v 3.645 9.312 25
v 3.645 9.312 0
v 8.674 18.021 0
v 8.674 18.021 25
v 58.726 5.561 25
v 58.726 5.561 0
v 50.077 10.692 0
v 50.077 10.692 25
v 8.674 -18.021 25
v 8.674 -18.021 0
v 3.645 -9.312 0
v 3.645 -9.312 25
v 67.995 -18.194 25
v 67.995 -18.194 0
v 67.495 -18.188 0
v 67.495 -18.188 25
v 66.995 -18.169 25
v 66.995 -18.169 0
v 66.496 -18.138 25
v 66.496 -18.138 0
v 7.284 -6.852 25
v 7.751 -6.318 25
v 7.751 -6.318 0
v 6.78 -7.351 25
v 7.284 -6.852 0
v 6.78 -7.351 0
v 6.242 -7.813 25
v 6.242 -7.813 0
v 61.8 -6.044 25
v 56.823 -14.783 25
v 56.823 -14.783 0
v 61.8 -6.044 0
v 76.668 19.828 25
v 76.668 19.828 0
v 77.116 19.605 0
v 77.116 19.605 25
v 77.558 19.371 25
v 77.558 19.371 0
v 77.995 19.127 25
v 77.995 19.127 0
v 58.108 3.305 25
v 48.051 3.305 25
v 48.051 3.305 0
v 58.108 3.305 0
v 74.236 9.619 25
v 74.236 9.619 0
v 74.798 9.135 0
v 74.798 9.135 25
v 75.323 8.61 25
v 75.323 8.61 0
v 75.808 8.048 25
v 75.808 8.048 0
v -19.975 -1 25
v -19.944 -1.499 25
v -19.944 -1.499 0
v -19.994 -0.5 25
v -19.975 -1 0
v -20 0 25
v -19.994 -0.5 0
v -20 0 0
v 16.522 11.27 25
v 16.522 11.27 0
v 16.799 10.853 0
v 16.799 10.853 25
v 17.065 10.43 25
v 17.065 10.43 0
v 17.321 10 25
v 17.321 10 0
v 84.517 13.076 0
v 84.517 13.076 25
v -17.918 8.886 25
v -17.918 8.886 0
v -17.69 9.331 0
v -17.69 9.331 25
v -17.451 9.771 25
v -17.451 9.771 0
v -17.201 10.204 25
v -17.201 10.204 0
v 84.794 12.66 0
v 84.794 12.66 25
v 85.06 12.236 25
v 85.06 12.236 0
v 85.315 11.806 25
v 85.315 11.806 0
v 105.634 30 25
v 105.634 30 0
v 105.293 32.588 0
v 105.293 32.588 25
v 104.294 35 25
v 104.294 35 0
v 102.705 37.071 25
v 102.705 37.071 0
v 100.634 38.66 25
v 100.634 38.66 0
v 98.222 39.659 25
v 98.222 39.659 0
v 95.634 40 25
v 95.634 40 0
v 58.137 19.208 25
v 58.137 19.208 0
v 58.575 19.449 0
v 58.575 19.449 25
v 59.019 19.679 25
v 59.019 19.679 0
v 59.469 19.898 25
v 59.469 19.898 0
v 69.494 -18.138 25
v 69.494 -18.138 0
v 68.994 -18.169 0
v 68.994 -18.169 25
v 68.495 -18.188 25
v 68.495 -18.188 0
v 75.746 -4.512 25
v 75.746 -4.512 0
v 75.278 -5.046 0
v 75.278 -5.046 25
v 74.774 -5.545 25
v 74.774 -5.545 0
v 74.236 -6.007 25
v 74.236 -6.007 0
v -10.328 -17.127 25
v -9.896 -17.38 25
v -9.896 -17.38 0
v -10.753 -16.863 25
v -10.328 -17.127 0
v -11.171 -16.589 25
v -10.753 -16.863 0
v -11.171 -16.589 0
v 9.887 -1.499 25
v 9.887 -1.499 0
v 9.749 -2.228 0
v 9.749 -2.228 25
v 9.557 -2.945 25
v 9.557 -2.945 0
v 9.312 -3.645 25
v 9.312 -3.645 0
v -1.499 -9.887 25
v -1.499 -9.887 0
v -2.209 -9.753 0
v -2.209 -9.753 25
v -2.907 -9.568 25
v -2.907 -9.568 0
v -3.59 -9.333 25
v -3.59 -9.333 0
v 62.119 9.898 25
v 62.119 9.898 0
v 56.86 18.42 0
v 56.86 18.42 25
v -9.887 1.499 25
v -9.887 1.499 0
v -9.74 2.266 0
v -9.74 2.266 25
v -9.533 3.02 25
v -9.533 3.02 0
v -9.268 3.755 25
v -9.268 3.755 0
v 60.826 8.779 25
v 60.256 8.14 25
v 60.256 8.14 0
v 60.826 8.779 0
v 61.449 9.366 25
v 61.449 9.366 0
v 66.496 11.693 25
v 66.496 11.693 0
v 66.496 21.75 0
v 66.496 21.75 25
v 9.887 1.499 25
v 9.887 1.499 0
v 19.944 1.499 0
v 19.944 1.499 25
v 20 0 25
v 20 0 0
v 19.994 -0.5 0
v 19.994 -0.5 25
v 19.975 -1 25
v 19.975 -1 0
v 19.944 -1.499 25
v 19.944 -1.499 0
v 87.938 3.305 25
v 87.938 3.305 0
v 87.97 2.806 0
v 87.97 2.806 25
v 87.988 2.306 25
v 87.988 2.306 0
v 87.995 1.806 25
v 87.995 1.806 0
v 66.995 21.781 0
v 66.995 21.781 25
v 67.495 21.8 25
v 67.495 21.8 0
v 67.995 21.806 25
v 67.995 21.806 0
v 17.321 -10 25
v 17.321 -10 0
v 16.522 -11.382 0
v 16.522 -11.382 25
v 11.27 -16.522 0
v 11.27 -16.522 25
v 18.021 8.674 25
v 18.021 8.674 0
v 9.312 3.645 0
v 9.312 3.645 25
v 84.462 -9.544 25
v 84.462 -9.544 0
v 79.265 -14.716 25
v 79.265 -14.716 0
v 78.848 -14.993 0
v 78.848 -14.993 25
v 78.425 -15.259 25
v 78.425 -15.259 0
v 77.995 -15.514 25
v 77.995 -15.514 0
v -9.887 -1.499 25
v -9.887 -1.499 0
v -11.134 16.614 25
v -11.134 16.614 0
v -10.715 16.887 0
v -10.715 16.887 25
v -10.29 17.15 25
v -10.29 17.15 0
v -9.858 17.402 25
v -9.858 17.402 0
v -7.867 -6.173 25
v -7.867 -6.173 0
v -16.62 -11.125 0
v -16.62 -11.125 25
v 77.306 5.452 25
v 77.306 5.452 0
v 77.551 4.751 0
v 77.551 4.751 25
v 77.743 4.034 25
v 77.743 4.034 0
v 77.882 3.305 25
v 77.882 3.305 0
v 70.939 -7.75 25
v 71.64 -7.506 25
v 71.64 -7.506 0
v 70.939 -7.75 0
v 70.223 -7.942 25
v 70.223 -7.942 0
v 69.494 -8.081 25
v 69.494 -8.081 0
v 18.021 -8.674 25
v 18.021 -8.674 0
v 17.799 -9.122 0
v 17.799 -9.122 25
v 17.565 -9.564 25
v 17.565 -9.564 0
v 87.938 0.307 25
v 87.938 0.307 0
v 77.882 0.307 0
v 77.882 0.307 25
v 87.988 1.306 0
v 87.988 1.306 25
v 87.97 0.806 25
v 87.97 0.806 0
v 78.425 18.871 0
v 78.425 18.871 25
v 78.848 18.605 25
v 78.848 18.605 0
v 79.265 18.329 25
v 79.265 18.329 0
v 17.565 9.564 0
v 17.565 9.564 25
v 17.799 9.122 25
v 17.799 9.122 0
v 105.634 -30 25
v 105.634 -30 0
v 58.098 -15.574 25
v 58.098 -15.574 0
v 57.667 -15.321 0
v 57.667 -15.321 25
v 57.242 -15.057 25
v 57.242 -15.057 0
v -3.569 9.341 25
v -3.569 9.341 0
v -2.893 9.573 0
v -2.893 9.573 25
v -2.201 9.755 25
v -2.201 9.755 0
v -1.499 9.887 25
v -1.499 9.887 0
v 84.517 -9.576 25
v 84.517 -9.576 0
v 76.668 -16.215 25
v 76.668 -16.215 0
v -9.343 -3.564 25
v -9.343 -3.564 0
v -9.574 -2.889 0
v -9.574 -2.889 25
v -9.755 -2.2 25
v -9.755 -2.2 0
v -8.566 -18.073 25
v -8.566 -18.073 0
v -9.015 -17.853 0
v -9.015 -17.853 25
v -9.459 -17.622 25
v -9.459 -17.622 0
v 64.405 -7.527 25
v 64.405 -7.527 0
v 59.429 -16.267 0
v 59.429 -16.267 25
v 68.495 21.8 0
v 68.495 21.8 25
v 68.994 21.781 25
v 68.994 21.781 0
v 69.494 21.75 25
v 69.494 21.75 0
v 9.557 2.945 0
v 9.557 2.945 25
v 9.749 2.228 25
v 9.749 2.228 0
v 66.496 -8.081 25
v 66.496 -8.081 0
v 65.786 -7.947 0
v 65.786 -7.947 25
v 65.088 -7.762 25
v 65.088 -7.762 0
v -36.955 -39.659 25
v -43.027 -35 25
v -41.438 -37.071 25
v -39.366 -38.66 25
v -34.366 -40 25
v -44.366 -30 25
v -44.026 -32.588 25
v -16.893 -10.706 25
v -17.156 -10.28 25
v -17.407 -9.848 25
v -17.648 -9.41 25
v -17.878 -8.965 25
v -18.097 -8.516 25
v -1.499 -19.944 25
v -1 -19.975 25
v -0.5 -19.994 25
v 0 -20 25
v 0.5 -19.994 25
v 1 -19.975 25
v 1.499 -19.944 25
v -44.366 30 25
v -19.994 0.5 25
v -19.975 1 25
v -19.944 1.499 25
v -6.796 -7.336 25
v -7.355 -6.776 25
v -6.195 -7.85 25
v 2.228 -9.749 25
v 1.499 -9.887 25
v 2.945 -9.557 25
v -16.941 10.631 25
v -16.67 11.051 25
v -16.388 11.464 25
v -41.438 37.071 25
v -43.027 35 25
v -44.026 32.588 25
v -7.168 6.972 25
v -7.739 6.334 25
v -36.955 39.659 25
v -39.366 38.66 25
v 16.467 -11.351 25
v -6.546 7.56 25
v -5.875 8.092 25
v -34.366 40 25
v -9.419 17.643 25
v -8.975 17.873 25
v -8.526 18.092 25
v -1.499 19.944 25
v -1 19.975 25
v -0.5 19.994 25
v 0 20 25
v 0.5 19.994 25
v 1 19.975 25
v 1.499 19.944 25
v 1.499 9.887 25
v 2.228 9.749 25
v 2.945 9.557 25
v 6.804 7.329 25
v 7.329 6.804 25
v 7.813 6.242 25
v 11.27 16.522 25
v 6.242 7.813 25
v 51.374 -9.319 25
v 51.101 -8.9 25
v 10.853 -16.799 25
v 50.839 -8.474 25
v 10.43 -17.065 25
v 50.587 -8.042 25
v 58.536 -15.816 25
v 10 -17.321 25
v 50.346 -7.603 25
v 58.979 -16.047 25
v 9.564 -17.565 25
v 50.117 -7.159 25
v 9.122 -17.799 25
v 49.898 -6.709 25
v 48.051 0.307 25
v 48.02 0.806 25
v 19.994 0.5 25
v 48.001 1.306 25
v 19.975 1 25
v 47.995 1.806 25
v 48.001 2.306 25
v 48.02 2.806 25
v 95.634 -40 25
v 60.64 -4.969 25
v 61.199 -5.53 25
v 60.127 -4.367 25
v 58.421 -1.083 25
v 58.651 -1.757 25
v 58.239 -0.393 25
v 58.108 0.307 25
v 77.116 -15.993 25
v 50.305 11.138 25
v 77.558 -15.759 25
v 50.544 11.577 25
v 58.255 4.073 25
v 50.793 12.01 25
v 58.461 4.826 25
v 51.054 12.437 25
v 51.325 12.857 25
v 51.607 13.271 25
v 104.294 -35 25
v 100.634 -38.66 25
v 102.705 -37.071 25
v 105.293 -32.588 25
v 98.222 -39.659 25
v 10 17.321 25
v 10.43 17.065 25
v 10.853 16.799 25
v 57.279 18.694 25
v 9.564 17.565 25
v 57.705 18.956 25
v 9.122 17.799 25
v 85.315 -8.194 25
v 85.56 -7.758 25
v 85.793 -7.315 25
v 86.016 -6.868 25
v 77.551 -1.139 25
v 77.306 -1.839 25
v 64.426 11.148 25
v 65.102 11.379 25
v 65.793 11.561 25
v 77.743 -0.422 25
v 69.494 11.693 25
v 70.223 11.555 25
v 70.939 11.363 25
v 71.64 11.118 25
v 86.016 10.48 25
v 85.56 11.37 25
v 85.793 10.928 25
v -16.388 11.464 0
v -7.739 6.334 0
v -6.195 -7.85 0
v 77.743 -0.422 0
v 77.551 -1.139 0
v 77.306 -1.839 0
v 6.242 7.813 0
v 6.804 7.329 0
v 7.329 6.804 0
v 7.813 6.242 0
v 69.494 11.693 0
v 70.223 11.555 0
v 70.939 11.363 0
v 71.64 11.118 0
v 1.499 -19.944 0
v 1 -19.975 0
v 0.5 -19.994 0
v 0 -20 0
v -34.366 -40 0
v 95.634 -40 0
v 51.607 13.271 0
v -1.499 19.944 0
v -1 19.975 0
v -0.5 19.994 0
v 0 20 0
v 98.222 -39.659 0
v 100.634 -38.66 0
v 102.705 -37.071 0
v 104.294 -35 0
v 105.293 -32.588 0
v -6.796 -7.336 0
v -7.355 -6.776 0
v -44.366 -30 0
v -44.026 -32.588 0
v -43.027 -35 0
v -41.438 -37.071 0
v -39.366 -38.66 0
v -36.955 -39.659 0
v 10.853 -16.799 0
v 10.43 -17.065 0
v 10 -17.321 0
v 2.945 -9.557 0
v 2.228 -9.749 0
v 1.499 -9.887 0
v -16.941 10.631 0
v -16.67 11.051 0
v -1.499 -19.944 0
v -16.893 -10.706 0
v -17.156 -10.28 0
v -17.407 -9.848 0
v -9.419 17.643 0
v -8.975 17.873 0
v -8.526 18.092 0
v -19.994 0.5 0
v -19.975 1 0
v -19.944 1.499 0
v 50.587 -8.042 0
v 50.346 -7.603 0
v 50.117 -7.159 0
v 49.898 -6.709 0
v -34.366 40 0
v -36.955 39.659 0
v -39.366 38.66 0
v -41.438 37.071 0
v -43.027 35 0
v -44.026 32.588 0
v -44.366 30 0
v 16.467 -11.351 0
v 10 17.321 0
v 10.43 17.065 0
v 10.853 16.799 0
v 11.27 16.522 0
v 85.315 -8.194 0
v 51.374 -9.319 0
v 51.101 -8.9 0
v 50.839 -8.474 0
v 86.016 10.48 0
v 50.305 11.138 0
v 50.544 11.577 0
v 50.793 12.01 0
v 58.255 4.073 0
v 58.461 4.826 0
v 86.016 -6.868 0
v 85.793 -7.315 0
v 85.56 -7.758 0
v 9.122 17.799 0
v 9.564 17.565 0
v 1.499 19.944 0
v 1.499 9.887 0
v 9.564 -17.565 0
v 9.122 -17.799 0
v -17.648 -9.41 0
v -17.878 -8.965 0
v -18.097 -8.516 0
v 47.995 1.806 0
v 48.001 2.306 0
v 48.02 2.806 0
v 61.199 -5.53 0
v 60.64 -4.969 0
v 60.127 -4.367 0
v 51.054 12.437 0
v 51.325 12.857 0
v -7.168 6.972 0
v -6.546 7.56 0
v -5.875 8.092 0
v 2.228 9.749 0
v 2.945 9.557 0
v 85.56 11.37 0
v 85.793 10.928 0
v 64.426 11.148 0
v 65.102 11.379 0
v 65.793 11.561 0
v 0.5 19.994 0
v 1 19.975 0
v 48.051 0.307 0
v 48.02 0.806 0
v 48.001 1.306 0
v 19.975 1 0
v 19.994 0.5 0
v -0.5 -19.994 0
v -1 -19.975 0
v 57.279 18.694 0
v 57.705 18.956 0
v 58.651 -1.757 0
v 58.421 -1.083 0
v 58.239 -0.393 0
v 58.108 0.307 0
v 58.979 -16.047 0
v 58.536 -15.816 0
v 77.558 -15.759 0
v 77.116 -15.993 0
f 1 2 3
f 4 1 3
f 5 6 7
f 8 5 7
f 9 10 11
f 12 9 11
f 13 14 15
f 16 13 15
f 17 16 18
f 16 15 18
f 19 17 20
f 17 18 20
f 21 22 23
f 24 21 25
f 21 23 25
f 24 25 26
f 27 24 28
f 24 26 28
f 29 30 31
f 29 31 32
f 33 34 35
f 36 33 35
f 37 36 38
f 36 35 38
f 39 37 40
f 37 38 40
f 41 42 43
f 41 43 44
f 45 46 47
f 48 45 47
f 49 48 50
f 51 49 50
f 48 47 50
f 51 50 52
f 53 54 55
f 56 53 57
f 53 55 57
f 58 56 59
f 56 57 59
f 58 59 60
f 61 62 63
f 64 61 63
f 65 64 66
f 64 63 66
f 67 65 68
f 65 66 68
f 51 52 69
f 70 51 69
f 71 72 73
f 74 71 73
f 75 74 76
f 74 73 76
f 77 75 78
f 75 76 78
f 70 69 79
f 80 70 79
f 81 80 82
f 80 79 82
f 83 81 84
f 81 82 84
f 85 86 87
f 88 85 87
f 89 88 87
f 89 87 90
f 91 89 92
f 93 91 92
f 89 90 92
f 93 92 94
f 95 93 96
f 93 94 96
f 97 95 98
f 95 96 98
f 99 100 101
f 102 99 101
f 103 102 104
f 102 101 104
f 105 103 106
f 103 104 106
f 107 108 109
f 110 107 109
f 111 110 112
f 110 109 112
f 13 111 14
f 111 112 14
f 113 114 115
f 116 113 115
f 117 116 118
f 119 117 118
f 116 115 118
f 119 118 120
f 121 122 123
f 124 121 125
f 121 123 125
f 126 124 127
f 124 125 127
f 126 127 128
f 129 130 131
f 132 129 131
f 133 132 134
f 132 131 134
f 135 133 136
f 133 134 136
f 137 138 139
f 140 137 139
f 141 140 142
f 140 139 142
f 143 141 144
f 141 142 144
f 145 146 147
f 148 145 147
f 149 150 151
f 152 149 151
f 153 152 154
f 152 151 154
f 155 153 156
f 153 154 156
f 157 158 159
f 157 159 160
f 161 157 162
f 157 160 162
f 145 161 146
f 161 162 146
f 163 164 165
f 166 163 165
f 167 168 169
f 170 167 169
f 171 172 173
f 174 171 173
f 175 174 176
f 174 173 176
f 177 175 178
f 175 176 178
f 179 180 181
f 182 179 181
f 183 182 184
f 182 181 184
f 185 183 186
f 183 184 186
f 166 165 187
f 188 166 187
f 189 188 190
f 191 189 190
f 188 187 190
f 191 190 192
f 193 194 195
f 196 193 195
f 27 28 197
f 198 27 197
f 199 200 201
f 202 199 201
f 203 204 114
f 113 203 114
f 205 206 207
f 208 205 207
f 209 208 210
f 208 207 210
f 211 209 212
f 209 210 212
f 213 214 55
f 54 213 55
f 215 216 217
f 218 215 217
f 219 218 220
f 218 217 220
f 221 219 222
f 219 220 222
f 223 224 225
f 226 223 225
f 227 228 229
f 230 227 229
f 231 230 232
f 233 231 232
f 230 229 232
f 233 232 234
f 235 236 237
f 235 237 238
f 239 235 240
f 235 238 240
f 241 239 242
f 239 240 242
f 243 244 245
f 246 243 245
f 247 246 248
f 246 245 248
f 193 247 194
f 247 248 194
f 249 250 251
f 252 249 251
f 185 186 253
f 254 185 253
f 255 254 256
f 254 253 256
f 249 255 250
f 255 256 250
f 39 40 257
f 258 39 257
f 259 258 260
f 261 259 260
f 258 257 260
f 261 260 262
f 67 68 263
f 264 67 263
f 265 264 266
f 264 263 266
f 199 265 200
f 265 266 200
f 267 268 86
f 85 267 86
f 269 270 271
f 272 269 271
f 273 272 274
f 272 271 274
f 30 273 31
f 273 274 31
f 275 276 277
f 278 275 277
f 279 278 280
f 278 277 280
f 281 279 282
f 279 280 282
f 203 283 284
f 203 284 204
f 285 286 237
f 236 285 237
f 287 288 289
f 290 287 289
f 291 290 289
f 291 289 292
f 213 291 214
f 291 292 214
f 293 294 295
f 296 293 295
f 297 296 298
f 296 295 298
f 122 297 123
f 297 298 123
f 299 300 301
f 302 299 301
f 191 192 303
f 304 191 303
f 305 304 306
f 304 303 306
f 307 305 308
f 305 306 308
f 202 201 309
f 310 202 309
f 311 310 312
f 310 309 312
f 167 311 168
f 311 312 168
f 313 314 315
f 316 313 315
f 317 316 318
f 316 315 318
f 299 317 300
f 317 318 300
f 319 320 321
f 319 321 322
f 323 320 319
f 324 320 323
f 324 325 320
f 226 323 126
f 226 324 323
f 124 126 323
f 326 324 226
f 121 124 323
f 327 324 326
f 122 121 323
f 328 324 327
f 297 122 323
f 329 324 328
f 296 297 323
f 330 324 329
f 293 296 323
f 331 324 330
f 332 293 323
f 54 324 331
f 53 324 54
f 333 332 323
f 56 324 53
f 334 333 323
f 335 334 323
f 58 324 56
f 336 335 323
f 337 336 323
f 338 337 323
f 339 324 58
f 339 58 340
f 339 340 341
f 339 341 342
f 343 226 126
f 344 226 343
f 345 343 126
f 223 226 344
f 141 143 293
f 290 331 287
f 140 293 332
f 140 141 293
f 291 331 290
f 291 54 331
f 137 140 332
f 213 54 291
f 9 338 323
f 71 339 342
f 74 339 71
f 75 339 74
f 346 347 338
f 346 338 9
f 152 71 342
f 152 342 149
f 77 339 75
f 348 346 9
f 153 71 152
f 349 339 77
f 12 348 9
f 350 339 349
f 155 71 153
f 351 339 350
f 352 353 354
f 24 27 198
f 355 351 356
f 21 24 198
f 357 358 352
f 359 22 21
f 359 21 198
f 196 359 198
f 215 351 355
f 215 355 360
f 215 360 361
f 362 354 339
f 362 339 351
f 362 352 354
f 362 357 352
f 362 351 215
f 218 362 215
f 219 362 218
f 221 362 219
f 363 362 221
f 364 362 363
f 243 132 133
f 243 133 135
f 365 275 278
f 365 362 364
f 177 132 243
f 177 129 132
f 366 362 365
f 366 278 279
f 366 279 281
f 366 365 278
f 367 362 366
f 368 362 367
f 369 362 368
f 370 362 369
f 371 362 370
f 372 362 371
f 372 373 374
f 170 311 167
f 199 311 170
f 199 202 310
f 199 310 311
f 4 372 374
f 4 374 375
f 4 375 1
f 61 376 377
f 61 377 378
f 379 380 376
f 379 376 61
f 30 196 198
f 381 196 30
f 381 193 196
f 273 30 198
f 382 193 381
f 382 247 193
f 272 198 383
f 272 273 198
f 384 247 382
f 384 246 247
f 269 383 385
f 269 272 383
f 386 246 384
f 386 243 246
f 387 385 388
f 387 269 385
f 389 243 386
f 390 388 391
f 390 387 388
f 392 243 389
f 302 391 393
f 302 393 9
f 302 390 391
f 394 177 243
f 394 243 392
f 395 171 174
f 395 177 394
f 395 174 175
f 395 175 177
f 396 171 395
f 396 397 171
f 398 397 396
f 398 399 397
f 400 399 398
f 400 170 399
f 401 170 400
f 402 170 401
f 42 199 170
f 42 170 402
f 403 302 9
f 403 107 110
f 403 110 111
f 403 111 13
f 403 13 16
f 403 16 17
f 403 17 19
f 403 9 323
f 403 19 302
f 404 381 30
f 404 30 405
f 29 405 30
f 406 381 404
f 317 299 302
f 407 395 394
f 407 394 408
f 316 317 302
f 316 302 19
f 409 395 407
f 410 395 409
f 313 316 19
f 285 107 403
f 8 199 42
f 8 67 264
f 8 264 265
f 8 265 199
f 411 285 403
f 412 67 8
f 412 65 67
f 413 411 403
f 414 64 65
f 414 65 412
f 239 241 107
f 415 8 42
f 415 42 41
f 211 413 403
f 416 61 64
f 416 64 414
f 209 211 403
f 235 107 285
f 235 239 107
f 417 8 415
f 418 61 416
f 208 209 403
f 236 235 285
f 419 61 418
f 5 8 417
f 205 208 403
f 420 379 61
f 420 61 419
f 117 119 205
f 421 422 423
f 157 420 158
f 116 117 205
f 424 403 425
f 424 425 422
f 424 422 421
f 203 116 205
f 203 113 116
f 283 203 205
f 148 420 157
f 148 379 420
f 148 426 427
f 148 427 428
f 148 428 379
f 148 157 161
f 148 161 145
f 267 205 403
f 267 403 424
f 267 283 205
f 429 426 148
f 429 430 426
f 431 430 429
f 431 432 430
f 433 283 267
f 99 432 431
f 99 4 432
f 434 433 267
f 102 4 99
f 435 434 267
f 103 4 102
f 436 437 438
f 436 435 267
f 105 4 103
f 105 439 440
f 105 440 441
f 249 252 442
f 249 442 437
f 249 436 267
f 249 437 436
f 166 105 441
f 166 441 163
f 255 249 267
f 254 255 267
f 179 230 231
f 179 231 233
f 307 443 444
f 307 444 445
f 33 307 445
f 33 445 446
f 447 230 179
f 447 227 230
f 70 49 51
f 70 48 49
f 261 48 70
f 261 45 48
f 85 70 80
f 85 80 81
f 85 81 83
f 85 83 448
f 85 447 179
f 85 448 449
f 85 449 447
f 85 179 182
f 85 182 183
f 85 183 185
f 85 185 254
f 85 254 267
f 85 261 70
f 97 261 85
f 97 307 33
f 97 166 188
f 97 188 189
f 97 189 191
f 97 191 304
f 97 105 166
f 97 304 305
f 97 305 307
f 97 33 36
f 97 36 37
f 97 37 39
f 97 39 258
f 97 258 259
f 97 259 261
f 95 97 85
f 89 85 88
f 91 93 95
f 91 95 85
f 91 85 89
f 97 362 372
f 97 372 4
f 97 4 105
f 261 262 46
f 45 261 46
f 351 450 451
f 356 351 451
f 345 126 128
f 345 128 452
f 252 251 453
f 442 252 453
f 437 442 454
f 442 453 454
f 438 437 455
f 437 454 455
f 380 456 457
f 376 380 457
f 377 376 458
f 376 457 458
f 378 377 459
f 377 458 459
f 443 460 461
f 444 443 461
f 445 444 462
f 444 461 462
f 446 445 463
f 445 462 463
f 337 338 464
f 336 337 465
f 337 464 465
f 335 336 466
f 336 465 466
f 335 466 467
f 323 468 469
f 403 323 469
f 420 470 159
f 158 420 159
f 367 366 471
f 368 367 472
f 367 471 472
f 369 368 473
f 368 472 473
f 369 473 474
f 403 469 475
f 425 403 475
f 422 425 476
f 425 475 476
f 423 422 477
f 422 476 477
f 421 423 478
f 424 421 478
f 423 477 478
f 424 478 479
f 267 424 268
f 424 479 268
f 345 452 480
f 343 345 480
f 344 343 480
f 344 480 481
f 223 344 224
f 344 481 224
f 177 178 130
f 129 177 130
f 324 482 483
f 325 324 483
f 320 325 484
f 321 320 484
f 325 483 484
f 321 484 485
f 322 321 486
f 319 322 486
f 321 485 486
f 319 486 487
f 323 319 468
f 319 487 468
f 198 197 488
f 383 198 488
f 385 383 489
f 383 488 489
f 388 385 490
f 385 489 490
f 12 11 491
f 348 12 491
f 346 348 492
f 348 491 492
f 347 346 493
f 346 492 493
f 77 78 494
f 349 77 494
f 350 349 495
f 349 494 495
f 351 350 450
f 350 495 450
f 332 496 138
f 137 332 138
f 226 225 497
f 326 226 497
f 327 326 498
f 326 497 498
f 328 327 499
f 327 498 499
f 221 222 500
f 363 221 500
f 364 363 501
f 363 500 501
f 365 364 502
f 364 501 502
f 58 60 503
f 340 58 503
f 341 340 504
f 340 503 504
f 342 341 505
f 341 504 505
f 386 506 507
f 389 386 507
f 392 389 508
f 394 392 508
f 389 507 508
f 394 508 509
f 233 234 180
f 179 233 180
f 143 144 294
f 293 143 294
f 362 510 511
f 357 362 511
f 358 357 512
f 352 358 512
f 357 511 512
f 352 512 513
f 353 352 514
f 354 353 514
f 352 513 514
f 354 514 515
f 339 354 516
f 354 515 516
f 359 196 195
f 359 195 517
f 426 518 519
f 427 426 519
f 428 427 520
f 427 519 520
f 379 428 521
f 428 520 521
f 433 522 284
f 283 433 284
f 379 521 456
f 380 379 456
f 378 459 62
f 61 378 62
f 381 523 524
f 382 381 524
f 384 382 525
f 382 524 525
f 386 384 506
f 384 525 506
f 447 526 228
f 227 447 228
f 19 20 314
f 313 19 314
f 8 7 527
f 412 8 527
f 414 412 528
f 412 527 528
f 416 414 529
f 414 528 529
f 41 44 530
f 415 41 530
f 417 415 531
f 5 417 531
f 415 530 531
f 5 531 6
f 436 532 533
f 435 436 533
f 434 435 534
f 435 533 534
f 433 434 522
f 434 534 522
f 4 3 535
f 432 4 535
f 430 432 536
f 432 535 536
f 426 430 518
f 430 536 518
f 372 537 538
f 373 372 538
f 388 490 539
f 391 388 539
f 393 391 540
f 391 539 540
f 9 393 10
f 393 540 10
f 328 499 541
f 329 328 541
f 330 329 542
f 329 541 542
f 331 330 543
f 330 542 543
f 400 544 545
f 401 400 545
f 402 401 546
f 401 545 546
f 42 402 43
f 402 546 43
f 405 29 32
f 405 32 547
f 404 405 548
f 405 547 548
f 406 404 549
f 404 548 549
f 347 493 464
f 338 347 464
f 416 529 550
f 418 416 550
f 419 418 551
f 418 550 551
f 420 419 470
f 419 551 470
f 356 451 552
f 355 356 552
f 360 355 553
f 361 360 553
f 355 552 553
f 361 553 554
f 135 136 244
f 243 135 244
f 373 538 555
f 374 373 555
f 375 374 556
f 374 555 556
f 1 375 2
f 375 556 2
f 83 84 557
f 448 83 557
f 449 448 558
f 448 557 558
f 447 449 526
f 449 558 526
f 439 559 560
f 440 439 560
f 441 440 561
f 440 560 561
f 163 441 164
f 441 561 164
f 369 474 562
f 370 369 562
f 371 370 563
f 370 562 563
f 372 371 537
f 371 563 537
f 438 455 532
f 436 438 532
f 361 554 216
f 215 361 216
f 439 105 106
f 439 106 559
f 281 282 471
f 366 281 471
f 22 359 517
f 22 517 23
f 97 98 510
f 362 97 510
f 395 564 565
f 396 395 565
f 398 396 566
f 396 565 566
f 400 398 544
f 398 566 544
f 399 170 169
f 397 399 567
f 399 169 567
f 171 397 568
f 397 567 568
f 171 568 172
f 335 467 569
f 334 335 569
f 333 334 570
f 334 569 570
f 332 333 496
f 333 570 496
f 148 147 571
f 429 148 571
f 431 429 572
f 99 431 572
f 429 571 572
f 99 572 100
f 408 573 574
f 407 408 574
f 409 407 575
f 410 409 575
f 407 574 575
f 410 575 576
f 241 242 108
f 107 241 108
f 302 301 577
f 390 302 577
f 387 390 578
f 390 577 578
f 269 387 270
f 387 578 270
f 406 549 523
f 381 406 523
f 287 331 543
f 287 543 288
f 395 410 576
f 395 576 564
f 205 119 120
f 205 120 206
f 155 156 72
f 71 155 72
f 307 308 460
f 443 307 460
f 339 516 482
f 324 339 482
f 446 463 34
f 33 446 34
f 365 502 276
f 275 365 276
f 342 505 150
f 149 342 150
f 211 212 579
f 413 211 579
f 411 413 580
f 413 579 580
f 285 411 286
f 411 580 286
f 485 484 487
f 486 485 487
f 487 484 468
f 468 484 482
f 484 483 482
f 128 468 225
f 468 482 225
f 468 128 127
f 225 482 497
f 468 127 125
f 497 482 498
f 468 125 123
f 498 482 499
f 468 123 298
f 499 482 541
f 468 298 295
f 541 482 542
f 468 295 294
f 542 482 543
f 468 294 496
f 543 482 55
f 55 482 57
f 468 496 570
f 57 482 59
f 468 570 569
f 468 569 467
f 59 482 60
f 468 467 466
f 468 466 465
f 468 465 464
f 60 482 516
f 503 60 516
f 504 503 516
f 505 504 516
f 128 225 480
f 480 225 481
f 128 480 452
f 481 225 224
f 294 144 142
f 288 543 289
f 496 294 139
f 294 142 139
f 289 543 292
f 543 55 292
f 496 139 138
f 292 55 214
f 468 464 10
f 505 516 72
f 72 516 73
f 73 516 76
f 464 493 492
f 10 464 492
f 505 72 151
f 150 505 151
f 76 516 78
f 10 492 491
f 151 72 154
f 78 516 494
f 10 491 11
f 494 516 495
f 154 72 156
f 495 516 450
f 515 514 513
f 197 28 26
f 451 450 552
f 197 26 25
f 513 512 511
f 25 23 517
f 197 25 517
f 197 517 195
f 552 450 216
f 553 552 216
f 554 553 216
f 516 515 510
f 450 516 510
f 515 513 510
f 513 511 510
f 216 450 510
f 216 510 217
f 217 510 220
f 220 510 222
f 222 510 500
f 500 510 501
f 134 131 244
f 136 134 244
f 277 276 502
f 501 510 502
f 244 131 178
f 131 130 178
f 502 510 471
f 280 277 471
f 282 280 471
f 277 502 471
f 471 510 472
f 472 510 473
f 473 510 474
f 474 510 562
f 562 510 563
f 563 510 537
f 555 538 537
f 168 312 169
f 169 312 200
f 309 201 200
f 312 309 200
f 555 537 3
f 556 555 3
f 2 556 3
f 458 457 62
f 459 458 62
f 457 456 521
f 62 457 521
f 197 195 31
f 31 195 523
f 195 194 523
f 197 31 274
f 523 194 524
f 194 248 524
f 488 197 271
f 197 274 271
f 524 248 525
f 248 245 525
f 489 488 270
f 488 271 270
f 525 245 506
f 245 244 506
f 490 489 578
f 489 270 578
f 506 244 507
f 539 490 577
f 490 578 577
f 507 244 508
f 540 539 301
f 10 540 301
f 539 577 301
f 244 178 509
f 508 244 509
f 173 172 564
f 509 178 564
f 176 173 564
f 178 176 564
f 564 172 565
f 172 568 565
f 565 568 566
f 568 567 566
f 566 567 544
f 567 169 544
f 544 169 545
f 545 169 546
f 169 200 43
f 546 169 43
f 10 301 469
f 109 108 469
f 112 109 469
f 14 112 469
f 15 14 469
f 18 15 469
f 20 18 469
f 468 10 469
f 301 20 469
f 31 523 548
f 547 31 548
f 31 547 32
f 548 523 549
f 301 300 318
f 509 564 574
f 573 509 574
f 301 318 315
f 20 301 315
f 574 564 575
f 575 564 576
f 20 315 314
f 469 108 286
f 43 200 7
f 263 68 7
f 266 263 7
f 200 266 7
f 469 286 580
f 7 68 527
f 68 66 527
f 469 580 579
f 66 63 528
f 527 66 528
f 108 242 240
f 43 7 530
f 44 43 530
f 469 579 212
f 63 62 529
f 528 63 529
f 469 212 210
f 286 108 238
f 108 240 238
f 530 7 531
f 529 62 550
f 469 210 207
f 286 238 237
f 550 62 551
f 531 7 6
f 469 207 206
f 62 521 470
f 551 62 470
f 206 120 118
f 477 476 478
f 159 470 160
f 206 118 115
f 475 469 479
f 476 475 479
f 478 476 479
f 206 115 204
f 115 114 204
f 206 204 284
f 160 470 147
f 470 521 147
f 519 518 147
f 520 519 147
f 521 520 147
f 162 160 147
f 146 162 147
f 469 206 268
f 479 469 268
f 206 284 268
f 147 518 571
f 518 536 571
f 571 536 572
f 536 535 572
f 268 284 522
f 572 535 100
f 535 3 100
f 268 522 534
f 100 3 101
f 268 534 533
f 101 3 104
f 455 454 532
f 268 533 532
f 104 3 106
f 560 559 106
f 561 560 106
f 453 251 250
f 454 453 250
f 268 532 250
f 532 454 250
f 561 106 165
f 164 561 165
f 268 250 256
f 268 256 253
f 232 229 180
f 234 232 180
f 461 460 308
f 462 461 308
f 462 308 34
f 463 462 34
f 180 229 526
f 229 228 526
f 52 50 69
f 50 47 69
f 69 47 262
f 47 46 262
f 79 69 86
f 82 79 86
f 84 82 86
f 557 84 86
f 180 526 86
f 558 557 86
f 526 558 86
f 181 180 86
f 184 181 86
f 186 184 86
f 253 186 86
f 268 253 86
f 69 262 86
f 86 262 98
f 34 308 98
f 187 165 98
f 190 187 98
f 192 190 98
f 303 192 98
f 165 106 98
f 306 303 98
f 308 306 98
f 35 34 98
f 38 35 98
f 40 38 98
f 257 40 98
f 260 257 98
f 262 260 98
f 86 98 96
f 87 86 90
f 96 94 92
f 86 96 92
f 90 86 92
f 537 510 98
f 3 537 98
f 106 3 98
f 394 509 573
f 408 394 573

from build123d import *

# Parameters (mm, degrees)
F1_DEPTH = 25


with BuildPart() as f1:
    # F0 (on Top) → F1 (new body)
    with BuildSketch(Plane.XY):
        with BuildLine():
            Line((-44.3664826453, 30), (-44.3664826453, 0))
            Line((-44.3664826453, 0), (-44.3664826453, -30))
            ThreePointArc((-44.3664826453, -30), (-41.4375504571, -37.0710678119), (-34.3664826453, -40))
            Line((-34.3664826453, -40), (95.6335173547, -40))
            ThreePointArc((95.6335173547, -40), (102.7045851666, -37.0710678119), (105.6335173547, -30))
            Line((105.6335173547, -30), (105.6335173547, 30))
            ThreePointArc((105.6335173547, 30), (102.7045851666, 37.0710678119), (95.6335173547, 40))
            Line((95.6335173547, 40), (-34.3664826453, 40))
            ThreePointArc((-34.3664826453, 40), (-41.4375504571, 37.0710678119), (-44.3664826453, 30))
        make_face()
        with BuildLine():
            ThreePointArc((-17.2011217286, 10.2039899685), (-16.8063733111, 10.8418548288), (-16.3879826165, 11.4644679668))
            Line((-16.3879826165, 11.4644679668), (-7.7386307522, 6.3335293543))
            ThreePointArc((-7.7386307522, 6.3335293543), (-6.8634313714, 7.2727786856), (-5.8751114363, 8.0921607505))
            Line((-5.8751114363, 8.0921607505), (-11.1341671305, 16.6141602951))
            ThreePointArc((-11.1341671305, 16.6141602951), (-10.503304654, 17.0200056212), (-9.8576667089, 17.4019081441))
            ThreePointArc((-9.8576667089, 17.4019081441), (-9.1981615432, 17.7593306244), (-8.5257169121, 18.0917702598))
            Line((-8.5257169121, 18.0917702598), (-3.5689222756, 9.341455657))
            ThreePointArc((-3.5689222756, 9.341455657), (-2.5485740405, 9.6697864692), (-1.4989449415, 9.8870199789))
            Line((-1.4989449415, 9.8870199789), (-1.4989449415, 19.94375))
            ThreePointArc((-1.4989449415, 19.94375), (-0.75, 19.9859325527), (0, 20))
            ThreePointArc((0, 20), (0.75, 19.9859325527), (1.4989449415, 19.94375))
            Line((1.4989449415, 19.94375), (1.4989449415, 9.8870199789))
            ThreePointArc((1.4989449415, 9.8870199789), (2.588190451, 9.6592582629), (3.6453855913, 9.3118829401))
            Line((3.6453855913, 9.3118829401), (8.6737506018, 18.0212666175))
            ThreePointArc((8.6737506018, 18.0212666175), (9.3434472235, 17.6833253089), (10, 17.3205080757))
            ThreePointArc((10, 17.3205080757), (10.6424853292, 16.9333253089), (11.2699993982, 16.522321676))
            Line((11.2699993982, 16.522321676), (6.2416343876, 7.8129379987))
            ThreePointArc((6.2416343876, 7.8129379987), (7.0710678119, 7.0710678119), (7.8129379987, 6.2416343876))
            Line((7.8129379987, 6.2416343876), (16.522321676, 11.2699993982))
            ThreePointArc((16.522321676, 11.2699993982), (16.9333253089, 10.6424853292), (17.3205080757, 10))
            ThreePointArc((17.3205080757, 10), (17.6833253089, 9.3434472235), (18.0212666175, 8.6737506018))
            Line((18.0212666175, 8.6737506018), (9.3118829401, 3.6453855913))
            ThreePointArc((9.3118829401, 3.6453855913), (9.6592582629, 2.588190451), (9.8870199789, 1.4989449415))
            Line((9.8870199789, 1.4989449415), (19.94375, 1.4989449415))
            ThreePointArc((19.94375, 1.4989449415), (19.9859325527, 0.75), (20, 0))
            ThreePointArc((20, 0), (19.9859325527, -0.75), (19.94375, -1.4989449415))
            Line((19.94375, -1.4989449415), (9.8870199789, -1.4989449415))
            ThreePointArc((9.8870199789, -1.4989449415), (9.6592582629, -2.588190451), (9.3118829401, -3.6453855913))
            Line((9.3118829401, -3.6453855913), (18.0212666175, -8.6737506018))
            ThreePointArc((18.0212666175, -8.6737506018), (17.6833253089, -9.3434472235), (17.3205080757, -10))
            Line((17.3205080757, -10), (16.522321676, -11.3824993982))
            Line((16.522321676, -11.3824993982), (16.4670589045, -11.3505934222))
            Line((16.4670589045, -11.3505934222), (7.7510062765, -6.3183780911))
            ThreePointArc((7.7510062765, -6.3183780911), (7.0361157976, -7.1058479073), (6.2416343876, -7.8129379987))
            Line((6.2416343876, -7.8129379987), (11.2699993982, -16.522321676))
            ThreePointArc((11.2699993982, -16.522321676), (10.6424853292, -16.9333253089), (10, -17.3205080757))
            ThreePointArc((10, -17.3205080757), (9.3434472235, -17.6833253089), (8.6737506018, -18.0212666175))
            Line((8.6737506018, -18.0212666175), (3.6453855913, -9.3118829401))
            ThreePointArc((3.6453855913, -9.3118829401), (2.588190451, -9.6592582629), (1.4989449415, -9.8870199789))
            Line((1.4989449415, -9.8870199789), (1.4989449415, -19.94375))
            ThreePointArc((1.4989449415, -19.94375), (0.75, -19.9859325527), (0, -20))
            ThreePointArc((0, -20), (-0.75, -19.9859325527), (-1.4989449415, -19.94375))
            Line((-1.4989449415, -19.94375), (-1.4989449415, -9.8870199789))
            ThreePointArc((-1.4989449415, -9.8870199789), (-2.5593257291, -9.6669463541), (-3.5896897256, -9.3334949335))
            Line((-3.5896897256, -9.3334949335), (-8.5659336261, -18.0727635162))
            ThreePointArc((-8.5659336261, -18.0727635162), (-9.237637217, -17.7388291228), (-9.8963458103, -17.3799407249))
            ThreePointArc((-9.8963458103, -17.3799407249), (-10.5411327714, -16.996603187), (-11.1710910494, -16.5893557671))
            Line((-11.1710910494, -16.5893557671), (-6.1948471489, -7.8500871844))
            ThreePointArc((-6.1948471489, -7.8500871844), (-7.0809164405, -7.0612054468), (-7.8673251482, -6.1729405482))
            Line((-7.8673251482, -6.1729405482), (-16.6204313192, -11.1248039426))
            ThreePointArc((-16.6204313192, -11.1248039426), (-17.025921115, -10.4937128885), (-17.4074597859, -9.847859859))
            ThreePointArc((-17.4074597859, -9.847859859), (-17.7645106044, -9.1881534046), (-18.0965712912, -8.5155215637))
            Line((-18.0965712912, -8.5155215637), (-9.3434651202, -3.5636581693))
            ThreePointArc((-9.3434651202, -3.5636581693), (-9.6705040957, -2.5458496686), (-9.8870199789, -1.4989449415))
            Line((-9.8870199789, -1.4989449415), (-19.94375, -1.4989449415))
            ThreePointArc((-19.94375, -1.4989449415), (-19.9859325527, -0.75), (-20, 0))
            ThreePointArc((-20, 0), (-19.9859325527, 0.75), (-19.94375, 1.4989449415))
            Line((-19.94375, 1.4989449415), (-9.8870199789, 1.4989449415))
            ThreePointArc((-9.8870199789, 1.4989449415), (-9.6437961572, 2.645221291), (-9.2681526668, 3.755175914))
            Line((-9.2681526668, 3.755175914), (-17.917504531, 8.8861145266))
            ThreePointArc((-17.917504531, 8.8861145266), (-17.5716725587, 9.5517706991), (-17.2011217286, 10.2039899685))
        make_face(mode=Mode.SUBTRACT)
        with BuildLine():
            ThreePointArc((50.7934512707, 12.0102323271), (51.1881996883, 12.6480971873), (51.6065903829, 13.2707103254))
            Line((51.6065903829, 13.2707103254), (60.2559422472, 8.1397717128))
            ThreePointArc((60.2559422472, 8.1397717128), (61.1311416279, 9.0790210442), (62.1194615631, 9.898403109))
            Line((62.1194615631, 9.898403109), (56.8604058688, 18.4204026536))
            ThreePointArc((56.8604058688, 18.4204026536), (57.4912683454, 18.8262479798), (58.1369062904, 19.2081505027))
            ThreePointArc((58.1369062904, 19.2081505027), (58.7964114562, 19.565572983), (59.4688560873, 19.8980126184))
            Line((59.4688560873, 19.8980126184), (64.4256507238, 11.1476980155))
            ThreePointArc((64.4256507238, 11.1476980155), (65.4459989589, 11.4760288278), (66.4956280579, 11.6932623374))
            Line((66.4956280579, 11.6932623374), (66.4956280579, 21.7499923586))
            ThreePointArc((66.4956280579, 21.7499923586), (67.2445729993, 21.7921749113), (67.9945729993, 21.8062423586))
            ThreePointArc((67.9945729993, 21.8062423586), (68.7445729993, 21.7921749113), (69.4935179408, 21.7499923586))
            Line((69.4935179408, 21.7499923586), (69.4935179408, 11.6932623374))
            ThreePointArc((69.4935179408, 11.6932623374), (70.5827634504, 11.4655006215), (71.6399585906, 11.1181252987))
            Line((71.6399585906, 11.1181252987), (76.6683236012, 19.827508976))
            ThreePointArc((76.6683236012, 19.827508976), (77.3380202228, 19.4895676675), (77.9945729993, 19.1267504343))
            ThreePointArc((77.9945729993, 19.1267504343), (78.6370583285, 18.7395676675), (79.2645723975, 18.3285640346))
            Line((79.2645723975, 18.3285640346), (74.236207387, 9.6191803573))
            ThreePointArc((74.236207387, 9.6191803573), (75.0656408112, 8.8773101704), (75.807510998, 8.0478767462))
            Line((75.807510998, 8.0478767462), (84.5168946753, 13.0762417567))
            ThreePointArc((84.5168946753, 13.0762417567), (84.9278983083, 12.4487276878), (85.315081075, 11.8062423586))
            ThreePointArc((85.315081075, 11.8062423586), (85.6778983083, 11.1496895821), (86.0158396168, 10.4799929604))
            Line((86.0158396168, 10.4799929604), (77.3064559395, 5.4516279498))
            ThreePointArc((77.3064559395, 5.4516279498), (77.6538312622, 4.3944328096), (77.8815929782, 3.3051873))
            Line((77.8815929782, 3.3051873), (87.9383229993, 3.3051873))
            ThreePointArc((87.9383229993, 3.3051873), (87.980505552, 2.5562423586), (87.9945729993, 1.8062423586))
            ThreePointArc((87.9945729993, 1.8062423586), (87.980505552, 1.0562423586), (87.9383229993, 0.3072974171))
            Line((87.9383229993, 0.3072974171), (77.8815929782, 0.3072974171))
            ThreePointArc((77.8815929782, 0.3072974171), (77.6538312622, -0.7819480924), (77.3064559395, -1.8391432327))
            Line((77.3064559395, -1.8391432327), (86.0158396168, -6.8675082433))
            ThreePointArc((86.0158396168, -6.8675082433), (85.6778983083, -7.5372048649), (85.315081075, -8.1937576414))
            Line((85.315081075, -8.1937576414), (84.5168946753, -9.5762570396))
            Line((84.5168946753, -9.5762570396), (84.4616319039, -9.5443510636))
            Line((84.4616319039, -9.5443510636), (75.7455792758, -4.5121357325))
            ThreePointArc((75.7455792758, -4.5121357325), (75.030688797, -5.2996055488), (74.236207387, -6.0066956401))
            Line((74.236207387, -6.0066956401), (79.2645723975, -14.7160793174))
            ThreePointArc((79.2645723975, -14.7160793174), (78.6370583285, -15.1270829504), (77.9945729993, -15.5142657171))
            ThreePointArc((77.9945729993, -15.5142657171), (77.3380202228, -15.8770829504), (76.6683236012, -16.2150242589))
            Line((76.6683236012, -16.2150242589), (71.6399585906, -7.5056405816))
            ThreePointArc((71.6399585906, -7.5056405816), (70.5827634504, -7.8530159043), (69.4935179408, -8.0807776203))
            Line((69.4935179408, -8.0807776203), (69.4935179408, -18.1375076414))
            ThreePointArc((69.4935179408, -18.1375076414), (68.7445729993, -18.1796901941), (67.9945729993, -18.1937576414))
            ThreePointArc((67.9945729993, -18.1937576414), (67.2445729993, -18.1796901941), (66.4956280579, -18.1375076414))
            Line((66.4956280579, -18.1375076414), (66.4956280579, -8.0807776203))
            ThreePointArc((66.4956280579, -8.0807776203), (65.4352472702, -7.8607039955), (64.4048832737, -7.5272525749))
            Line((64.4048832737, -7.5272525749), (59.4286393732, -16.2665211576))
            ThreePointArc((59.4286393732, -16.2665211576), (58.7569357824, -15.9325867642), (58.098227189, -15.5736983664))
            ThreePointArc((58.098227189, -15.5736983664), (57.453440228, -15.1903608284), (56.82348195, -14.7831134085))
            Line((56.82348195, -14.7831134085), (61.7997258505, -6.0438448258))
            ThreePointArc((61.7997258505, -6.0438448258), (60.9136565588, -5.2549630882), (60.1272478511, -4.3666981897))
            Line((60.1272478511, -4.3666981897), (51.3741416801, -9.3185615841))
            ThreePointArc((51.3741416801, -9.3185615841), (50.9686518844, -8.6874705299), (50.5871132135, -8.0416175004))
            ThreePointArc((50.5871132135, -8.0416175004), (50.2300623949, -7.381911046), (49.8980017081, -6.7092792051))
            Line((49.8980017081, -6.7092792051), (58.6511078791, -1.7574158107))
            ThreePointArc((58.6511078791, -1.7574158107), (58.3240689037, -0.7396073101), (58.1075530205, 0.3072974171))
            Line((58.1075530205, 0.3072974171), (48.0508229993, 0.3072974171))
            ThreePointArc((48.0508229993, 0.3072974171), (48.0086404467, 1.0562423586), (47.9945729993, 1.8062423586))
            ThreePointArc((47.9945729993, 1.8062423586), (48.0086404467, 2.5562423586), (48.0508229993, 3.3051873))
            Line((48.0508229993, 3.3051873), (58.1075530205, 3.3051873))
            ThreePointArc((58.1075530205, 3.3051873), (58.3507768422, 4.4514636496), (58.7264203326, 5.5614182726))
            Line((58.7264203326, 5.5614182726), (50.0770684683, 10.6923568852))
            ThreePointArc((50.0770684683, 10.6923568852), (50.4229004406, 11.3580130577), (50.7934512707, 12.0102323271))
        make_face(mode=Mode.SUBTRACT)
    extrude(amount=F1_DEPTH)


solid = f1.part
